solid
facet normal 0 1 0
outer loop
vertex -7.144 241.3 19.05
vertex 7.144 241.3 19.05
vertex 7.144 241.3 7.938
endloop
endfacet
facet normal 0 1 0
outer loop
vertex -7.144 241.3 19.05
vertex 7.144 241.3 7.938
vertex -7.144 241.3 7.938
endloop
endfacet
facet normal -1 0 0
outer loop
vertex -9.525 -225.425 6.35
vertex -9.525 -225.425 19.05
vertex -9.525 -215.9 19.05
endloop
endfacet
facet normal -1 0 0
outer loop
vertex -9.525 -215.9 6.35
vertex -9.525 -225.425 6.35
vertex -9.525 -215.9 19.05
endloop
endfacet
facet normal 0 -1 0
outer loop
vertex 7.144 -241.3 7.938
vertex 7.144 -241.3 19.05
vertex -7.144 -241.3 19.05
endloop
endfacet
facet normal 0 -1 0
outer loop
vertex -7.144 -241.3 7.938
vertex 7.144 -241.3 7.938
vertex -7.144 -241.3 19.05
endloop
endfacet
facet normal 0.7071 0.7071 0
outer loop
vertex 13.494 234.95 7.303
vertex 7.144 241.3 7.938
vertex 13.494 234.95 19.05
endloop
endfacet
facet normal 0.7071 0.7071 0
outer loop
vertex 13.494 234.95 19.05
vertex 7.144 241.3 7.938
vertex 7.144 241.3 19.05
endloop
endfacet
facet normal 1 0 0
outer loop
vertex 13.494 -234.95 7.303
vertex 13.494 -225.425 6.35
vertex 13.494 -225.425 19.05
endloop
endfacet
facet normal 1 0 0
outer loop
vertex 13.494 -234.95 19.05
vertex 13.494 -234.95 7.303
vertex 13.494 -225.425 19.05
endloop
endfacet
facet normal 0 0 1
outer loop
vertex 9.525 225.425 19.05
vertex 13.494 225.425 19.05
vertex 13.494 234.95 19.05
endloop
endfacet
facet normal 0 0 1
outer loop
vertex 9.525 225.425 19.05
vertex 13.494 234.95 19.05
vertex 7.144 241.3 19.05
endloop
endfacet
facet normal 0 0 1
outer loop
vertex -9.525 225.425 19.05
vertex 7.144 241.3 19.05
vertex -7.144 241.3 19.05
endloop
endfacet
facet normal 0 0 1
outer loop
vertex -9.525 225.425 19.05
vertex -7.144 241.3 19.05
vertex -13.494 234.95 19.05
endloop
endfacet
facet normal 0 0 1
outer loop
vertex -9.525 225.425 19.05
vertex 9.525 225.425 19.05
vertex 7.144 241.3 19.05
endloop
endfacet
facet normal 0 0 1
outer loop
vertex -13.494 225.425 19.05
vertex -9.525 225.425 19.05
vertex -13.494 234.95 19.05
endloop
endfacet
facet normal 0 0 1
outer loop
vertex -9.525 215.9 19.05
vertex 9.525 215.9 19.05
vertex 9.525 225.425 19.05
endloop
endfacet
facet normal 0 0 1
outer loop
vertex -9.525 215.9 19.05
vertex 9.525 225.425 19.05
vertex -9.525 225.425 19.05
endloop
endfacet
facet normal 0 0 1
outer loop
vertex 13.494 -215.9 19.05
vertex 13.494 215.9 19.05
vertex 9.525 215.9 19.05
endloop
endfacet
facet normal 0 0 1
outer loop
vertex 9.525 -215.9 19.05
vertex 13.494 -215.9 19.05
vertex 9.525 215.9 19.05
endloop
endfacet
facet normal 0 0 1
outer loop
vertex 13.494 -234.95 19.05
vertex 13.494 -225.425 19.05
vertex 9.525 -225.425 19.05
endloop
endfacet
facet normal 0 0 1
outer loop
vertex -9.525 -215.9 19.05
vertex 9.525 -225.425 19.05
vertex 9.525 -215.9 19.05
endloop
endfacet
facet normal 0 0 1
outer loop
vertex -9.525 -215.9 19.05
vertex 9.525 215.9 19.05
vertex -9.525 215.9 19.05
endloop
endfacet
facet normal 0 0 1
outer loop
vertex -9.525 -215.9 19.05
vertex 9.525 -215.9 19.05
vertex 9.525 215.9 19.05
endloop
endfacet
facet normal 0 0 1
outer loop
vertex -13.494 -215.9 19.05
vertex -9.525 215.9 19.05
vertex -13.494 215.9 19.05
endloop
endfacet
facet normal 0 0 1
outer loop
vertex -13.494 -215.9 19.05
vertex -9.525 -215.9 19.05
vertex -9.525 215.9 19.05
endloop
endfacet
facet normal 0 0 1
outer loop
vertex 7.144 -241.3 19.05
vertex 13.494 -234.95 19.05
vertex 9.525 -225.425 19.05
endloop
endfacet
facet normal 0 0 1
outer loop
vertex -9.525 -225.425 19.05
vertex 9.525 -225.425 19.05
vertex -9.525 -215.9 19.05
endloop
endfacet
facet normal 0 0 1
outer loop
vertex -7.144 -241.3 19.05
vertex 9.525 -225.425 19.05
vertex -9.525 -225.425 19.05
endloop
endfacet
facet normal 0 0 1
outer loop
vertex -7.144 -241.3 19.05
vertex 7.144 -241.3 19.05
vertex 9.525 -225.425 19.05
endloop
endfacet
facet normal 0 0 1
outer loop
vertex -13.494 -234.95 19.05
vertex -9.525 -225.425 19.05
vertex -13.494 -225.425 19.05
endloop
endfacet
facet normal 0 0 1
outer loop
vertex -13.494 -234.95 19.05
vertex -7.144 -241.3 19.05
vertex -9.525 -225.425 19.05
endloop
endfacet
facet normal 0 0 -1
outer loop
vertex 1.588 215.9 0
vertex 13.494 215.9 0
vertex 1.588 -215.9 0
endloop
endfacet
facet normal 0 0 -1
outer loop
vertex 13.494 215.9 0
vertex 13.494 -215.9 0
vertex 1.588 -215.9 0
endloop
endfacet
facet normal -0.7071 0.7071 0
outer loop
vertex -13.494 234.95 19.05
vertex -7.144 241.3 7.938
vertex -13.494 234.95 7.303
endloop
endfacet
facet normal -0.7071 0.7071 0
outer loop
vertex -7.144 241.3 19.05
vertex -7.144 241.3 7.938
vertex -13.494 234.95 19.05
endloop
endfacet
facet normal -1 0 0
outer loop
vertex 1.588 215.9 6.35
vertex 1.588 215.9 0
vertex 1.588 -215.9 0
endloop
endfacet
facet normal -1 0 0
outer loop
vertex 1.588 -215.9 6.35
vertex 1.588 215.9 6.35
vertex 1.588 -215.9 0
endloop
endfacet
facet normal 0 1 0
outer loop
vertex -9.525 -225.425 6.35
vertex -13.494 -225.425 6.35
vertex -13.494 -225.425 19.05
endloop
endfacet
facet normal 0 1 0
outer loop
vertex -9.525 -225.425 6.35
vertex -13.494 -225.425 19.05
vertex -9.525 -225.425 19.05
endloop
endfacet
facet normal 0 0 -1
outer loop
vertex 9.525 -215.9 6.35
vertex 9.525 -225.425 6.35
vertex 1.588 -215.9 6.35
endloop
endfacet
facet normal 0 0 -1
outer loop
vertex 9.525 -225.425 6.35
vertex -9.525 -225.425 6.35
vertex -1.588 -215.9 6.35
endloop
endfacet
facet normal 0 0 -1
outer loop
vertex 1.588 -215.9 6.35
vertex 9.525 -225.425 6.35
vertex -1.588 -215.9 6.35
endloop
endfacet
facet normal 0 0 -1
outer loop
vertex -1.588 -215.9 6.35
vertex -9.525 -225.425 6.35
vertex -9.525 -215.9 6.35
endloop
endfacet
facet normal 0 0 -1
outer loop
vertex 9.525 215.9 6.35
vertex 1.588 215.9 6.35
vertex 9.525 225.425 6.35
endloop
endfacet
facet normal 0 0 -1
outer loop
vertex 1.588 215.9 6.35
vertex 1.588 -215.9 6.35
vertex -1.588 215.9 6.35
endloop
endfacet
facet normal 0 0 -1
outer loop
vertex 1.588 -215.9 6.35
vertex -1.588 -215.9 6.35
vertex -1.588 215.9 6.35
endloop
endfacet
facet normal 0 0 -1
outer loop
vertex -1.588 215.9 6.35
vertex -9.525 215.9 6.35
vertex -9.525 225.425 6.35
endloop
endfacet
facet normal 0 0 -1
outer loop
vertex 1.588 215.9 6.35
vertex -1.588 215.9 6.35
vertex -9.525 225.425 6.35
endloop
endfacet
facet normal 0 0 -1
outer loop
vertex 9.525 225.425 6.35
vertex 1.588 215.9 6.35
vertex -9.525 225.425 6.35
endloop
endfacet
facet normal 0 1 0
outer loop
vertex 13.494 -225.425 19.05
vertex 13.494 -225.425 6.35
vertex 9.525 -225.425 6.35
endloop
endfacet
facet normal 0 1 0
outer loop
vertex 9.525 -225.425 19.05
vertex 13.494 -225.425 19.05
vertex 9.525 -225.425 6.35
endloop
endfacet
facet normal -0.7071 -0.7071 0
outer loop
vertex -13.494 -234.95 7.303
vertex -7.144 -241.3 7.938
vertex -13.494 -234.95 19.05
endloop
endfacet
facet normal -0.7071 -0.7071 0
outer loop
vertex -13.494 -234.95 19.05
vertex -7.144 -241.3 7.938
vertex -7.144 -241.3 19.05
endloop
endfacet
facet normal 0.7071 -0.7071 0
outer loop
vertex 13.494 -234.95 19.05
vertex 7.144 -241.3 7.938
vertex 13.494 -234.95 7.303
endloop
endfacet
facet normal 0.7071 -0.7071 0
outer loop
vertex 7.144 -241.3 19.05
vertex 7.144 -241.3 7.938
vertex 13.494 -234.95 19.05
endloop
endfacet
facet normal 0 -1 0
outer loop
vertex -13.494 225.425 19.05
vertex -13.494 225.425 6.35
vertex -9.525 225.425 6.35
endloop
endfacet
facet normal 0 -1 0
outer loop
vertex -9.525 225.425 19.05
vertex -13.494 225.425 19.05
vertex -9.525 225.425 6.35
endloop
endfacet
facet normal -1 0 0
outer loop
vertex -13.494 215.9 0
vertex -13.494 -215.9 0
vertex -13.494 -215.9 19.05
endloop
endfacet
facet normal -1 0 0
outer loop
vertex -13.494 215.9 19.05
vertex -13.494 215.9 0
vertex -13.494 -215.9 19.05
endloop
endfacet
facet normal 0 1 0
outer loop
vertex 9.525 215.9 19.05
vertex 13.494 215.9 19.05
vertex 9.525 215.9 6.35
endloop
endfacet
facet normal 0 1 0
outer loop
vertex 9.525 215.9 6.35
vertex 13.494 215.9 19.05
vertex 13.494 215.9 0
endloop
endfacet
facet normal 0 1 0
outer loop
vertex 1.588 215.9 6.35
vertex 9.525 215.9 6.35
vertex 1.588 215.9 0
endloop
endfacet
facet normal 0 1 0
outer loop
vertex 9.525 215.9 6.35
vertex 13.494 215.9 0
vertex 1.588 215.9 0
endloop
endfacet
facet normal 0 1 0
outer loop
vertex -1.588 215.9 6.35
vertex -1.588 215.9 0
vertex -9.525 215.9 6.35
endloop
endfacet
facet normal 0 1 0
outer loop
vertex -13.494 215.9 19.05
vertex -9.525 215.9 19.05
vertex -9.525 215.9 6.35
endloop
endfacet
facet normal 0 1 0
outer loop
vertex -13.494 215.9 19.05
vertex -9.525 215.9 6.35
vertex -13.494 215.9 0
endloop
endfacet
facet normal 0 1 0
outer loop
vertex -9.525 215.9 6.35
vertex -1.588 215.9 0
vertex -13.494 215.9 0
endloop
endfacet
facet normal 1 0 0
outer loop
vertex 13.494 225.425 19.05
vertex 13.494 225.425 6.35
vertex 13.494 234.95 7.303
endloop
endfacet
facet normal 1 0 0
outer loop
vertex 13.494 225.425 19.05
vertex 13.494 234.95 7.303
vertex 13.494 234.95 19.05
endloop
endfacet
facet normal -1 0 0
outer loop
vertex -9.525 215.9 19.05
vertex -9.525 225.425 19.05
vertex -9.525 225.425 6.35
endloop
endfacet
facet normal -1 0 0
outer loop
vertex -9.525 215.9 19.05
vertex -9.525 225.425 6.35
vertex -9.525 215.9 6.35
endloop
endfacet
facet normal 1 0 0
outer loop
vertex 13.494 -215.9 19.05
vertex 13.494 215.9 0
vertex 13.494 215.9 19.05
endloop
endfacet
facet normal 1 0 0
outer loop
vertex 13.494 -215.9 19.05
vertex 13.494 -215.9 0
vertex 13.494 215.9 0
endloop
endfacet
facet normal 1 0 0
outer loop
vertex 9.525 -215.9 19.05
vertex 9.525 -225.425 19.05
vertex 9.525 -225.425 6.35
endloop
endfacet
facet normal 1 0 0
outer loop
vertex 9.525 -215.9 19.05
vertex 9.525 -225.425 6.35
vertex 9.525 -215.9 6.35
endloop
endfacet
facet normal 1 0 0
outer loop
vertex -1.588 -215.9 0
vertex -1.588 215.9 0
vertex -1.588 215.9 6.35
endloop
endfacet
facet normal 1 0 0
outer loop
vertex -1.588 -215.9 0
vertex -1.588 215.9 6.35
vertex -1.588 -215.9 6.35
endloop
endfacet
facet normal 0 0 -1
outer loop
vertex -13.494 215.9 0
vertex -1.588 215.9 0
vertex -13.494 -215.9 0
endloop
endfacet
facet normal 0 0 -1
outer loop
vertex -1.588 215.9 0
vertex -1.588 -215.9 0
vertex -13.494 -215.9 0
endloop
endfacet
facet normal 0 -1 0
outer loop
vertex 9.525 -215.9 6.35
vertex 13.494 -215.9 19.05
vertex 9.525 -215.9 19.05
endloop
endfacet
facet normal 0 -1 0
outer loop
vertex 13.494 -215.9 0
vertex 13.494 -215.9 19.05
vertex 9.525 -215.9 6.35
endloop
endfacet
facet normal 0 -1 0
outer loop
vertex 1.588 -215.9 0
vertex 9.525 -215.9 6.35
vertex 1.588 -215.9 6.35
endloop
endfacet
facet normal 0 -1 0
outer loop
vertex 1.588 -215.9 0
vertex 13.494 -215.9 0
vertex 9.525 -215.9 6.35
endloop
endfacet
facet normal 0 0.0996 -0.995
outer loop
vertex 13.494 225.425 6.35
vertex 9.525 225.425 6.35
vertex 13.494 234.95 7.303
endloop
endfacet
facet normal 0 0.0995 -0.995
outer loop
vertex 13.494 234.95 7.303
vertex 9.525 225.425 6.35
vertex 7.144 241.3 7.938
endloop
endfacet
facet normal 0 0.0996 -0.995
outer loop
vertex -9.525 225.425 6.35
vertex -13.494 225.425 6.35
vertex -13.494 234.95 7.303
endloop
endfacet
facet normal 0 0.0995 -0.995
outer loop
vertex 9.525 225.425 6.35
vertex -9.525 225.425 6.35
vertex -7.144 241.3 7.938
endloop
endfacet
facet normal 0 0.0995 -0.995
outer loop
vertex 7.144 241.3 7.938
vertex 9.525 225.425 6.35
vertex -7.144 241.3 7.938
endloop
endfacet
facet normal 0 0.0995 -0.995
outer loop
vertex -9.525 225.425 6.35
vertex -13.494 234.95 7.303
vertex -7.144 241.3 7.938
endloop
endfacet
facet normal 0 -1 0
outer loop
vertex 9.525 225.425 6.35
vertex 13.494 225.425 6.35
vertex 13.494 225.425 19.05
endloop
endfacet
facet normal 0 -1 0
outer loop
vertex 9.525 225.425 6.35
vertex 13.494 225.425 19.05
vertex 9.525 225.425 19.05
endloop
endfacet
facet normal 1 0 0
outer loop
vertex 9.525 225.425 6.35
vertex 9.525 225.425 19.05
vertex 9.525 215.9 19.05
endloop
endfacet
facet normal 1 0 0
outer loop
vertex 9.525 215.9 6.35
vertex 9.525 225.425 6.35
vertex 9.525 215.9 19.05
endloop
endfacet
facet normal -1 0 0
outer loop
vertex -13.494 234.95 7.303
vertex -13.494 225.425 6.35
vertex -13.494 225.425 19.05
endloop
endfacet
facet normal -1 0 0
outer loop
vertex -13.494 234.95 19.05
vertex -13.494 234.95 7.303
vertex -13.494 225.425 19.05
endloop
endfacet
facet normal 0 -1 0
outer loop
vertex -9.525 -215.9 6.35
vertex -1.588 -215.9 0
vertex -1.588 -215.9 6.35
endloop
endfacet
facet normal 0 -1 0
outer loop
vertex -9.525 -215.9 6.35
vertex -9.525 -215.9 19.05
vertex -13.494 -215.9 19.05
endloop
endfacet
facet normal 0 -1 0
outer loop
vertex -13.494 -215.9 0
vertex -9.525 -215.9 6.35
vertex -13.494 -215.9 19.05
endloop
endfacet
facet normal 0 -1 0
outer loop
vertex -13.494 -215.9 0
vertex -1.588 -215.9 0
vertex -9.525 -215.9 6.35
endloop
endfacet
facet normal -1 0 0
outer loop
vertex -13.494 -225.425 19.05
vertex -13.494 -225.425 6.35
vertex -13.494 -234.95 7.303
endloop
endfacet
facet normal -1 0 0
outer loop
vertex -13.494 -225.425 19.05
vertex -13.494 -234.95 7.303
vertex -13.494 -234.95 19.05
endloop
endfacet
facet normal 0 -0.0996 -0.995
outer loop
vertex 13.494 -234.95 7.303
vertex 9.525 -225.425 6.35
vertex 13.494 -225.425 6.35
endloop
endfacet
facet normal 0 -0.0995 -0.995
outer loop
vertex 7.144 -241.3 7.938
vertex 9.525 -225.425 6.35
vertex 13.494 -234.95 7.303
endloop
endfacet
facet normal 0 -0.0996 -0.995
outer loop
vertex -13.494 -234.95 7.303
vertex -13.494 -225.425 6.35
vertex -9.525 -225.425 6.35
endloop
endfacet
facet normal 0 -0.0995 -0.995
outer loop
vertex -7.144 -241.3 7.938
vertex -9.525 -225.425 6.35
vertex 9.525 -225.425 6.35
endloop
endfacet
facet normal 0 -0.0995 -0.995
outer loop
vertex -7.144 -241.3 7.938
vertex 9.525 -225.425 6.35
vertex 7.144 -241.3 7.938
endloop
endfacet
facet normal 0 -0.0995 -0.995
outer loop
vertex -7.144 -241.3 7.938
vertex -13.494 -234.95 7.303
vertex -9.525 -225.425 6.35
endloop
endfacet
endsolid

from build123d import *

# Parameters (mm, degrees)
F0_W      = 13.49375
F0_H      = 19.05
F1_DEPTH  = 241.3
F2_W      = 3.96875
F2_H      = 9.525
F3_DEPTH  = 19.051
F5_DEPTH  = 13.49475
F6_SIZE   = 6.35
F9_W      = 3.175
F9_H      = 431.8
F10_DEPTH = 6.35


with BuildPart() as f1:
    # F0 (on Front) → F1 (new body)
    with BuildSketch(Plane.XZ):
        with Locations((-6.746875, 9.525)):
            Rectangle(F0_W, F0_H)
    extrude(amount=F1_DEPTH)

    # F2 (on Top) → F3 (cut, through all)
    with BuildSketch(Plane.XY):
        with Locations((-11.509375, -220.6625)):
            Rectangle(F2_W, F2_H)
    extrude(amount=F3_DEPTH, mode=Mode.SUBTRACT)

    # F4 (on Right) → F5 (cut, through all)
    with BuildSketch(Plane.YZ):
        Polygon((-215.9, 0), (-215.9, 6.35), (-225.425, 6.35), (-241.3, 7.9375), (-241.3, 0), align=None)
    extrude(amount=-F5_DEPTH, mode=Mode.SUBTRACT)

    # F6
    f6_edges = [f1.edges().sort_by_distance(p)[0] for p in [
        (-13.49375, -241.3, 13.49375),
    ]]
    chamfer(f6_edges, length=F6_SIZE)

    # F7: F1 across plane


with BuildPart() as f1_1:
    add(f1.part)
    add(f1.part.mirror(Plane.YZ))

    # F8: F1 across plane


with BuildPart() as f1_2:
    add(f1_1.part)
    add(f1_1.part.mirror(Plane.XZ))

    # F9 (on face) → F10 (cut)
    with BuildSketch(Plane(origin=(0, 0, 0), x_dir=(1, 0, 0), z_dir=(0, 0, -1))):
        Rectangle(F9_W, F9_H)
    extrude(amount=-F10_DEPTH, mode=Mode.SUBTRACT)


solid = f1_2.part
